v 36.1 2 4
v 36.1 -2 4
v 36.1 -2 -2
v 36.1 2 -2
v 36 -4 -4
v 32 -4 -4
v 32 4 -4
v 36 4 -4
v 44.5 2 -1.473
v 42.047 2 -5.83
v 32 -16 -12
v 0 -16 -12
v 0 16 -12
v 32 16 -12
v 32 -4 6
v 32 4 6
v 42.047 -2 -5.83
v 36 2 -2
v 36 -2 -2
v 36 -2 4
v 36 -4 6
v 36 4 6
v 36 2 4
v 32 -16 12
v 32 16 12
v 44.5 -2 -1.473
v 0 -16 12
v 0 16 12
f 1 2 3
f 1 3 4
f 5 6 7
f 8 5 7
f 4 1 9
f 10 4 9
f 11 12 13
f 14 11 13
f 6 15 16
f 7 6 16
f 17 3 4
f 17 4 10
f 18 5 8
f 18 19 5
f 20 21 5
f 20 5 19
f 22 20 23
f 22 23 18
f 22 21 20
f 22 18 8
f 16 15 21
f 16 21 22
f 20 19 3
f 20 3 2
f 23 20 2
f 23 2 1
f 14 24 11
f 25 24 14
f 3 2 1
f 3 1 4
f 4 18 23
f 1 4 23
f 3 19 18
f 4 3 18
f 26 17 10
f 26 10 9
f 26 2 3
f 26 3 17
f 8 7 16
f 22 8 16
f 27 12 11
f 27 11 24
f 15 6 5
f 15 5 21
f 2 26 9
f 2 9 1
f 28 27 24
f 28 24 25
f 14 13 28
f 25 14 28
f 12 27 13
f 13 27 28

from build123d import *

# Parameters (mm, degrees)
F0_W     = 32
F0_H     = 24
F1_DEPTH = 32
F2_W     = 8
F2_H     = 10
F3_DEPTH = 4
F4_W     = 4
F4_H     = 6
F5_DEPTH = 0.1
F7_DEPTH = 4


with BuildPart() as f1:
    # F0 (on Right) → F1 (new body)
    with BuildSketch(Plane.YZ):
        Rectangle(F0_W, F0_H)
    extrude(amount=F1_DEPTH)


with BuildPart() as f3:
    # F2 (on face) → F3 (new body)
    with BuildSketch(Plane.YZ.offset(32)):
        with Locations((0, 1)):
            Rectangle(F2_W, F2_H)
    extrude(amount=F3_DEPTH)

    # F4 (on face) → F5 (join)
    with BuildSketch(Plane.YZ.offset(36)):
        with Locations((0, 1)):
            Rectangle(F4_W, F4_H)
    extrude(amount=F5_DEPTH)


with BuildPart() as f7:
    # F6 (on face) → F7 (new body)
    with BuildSketch(Plane.XZ.offset(2)):
        Polygon((44.500296, -1.47318), (36.1, 4), (36.1, -2), (42.047321, -5.830254), align=None)
    extrude(amount=-F7_DEPTH)


solid = Compound([f1.part, f3.part, f7.part])
